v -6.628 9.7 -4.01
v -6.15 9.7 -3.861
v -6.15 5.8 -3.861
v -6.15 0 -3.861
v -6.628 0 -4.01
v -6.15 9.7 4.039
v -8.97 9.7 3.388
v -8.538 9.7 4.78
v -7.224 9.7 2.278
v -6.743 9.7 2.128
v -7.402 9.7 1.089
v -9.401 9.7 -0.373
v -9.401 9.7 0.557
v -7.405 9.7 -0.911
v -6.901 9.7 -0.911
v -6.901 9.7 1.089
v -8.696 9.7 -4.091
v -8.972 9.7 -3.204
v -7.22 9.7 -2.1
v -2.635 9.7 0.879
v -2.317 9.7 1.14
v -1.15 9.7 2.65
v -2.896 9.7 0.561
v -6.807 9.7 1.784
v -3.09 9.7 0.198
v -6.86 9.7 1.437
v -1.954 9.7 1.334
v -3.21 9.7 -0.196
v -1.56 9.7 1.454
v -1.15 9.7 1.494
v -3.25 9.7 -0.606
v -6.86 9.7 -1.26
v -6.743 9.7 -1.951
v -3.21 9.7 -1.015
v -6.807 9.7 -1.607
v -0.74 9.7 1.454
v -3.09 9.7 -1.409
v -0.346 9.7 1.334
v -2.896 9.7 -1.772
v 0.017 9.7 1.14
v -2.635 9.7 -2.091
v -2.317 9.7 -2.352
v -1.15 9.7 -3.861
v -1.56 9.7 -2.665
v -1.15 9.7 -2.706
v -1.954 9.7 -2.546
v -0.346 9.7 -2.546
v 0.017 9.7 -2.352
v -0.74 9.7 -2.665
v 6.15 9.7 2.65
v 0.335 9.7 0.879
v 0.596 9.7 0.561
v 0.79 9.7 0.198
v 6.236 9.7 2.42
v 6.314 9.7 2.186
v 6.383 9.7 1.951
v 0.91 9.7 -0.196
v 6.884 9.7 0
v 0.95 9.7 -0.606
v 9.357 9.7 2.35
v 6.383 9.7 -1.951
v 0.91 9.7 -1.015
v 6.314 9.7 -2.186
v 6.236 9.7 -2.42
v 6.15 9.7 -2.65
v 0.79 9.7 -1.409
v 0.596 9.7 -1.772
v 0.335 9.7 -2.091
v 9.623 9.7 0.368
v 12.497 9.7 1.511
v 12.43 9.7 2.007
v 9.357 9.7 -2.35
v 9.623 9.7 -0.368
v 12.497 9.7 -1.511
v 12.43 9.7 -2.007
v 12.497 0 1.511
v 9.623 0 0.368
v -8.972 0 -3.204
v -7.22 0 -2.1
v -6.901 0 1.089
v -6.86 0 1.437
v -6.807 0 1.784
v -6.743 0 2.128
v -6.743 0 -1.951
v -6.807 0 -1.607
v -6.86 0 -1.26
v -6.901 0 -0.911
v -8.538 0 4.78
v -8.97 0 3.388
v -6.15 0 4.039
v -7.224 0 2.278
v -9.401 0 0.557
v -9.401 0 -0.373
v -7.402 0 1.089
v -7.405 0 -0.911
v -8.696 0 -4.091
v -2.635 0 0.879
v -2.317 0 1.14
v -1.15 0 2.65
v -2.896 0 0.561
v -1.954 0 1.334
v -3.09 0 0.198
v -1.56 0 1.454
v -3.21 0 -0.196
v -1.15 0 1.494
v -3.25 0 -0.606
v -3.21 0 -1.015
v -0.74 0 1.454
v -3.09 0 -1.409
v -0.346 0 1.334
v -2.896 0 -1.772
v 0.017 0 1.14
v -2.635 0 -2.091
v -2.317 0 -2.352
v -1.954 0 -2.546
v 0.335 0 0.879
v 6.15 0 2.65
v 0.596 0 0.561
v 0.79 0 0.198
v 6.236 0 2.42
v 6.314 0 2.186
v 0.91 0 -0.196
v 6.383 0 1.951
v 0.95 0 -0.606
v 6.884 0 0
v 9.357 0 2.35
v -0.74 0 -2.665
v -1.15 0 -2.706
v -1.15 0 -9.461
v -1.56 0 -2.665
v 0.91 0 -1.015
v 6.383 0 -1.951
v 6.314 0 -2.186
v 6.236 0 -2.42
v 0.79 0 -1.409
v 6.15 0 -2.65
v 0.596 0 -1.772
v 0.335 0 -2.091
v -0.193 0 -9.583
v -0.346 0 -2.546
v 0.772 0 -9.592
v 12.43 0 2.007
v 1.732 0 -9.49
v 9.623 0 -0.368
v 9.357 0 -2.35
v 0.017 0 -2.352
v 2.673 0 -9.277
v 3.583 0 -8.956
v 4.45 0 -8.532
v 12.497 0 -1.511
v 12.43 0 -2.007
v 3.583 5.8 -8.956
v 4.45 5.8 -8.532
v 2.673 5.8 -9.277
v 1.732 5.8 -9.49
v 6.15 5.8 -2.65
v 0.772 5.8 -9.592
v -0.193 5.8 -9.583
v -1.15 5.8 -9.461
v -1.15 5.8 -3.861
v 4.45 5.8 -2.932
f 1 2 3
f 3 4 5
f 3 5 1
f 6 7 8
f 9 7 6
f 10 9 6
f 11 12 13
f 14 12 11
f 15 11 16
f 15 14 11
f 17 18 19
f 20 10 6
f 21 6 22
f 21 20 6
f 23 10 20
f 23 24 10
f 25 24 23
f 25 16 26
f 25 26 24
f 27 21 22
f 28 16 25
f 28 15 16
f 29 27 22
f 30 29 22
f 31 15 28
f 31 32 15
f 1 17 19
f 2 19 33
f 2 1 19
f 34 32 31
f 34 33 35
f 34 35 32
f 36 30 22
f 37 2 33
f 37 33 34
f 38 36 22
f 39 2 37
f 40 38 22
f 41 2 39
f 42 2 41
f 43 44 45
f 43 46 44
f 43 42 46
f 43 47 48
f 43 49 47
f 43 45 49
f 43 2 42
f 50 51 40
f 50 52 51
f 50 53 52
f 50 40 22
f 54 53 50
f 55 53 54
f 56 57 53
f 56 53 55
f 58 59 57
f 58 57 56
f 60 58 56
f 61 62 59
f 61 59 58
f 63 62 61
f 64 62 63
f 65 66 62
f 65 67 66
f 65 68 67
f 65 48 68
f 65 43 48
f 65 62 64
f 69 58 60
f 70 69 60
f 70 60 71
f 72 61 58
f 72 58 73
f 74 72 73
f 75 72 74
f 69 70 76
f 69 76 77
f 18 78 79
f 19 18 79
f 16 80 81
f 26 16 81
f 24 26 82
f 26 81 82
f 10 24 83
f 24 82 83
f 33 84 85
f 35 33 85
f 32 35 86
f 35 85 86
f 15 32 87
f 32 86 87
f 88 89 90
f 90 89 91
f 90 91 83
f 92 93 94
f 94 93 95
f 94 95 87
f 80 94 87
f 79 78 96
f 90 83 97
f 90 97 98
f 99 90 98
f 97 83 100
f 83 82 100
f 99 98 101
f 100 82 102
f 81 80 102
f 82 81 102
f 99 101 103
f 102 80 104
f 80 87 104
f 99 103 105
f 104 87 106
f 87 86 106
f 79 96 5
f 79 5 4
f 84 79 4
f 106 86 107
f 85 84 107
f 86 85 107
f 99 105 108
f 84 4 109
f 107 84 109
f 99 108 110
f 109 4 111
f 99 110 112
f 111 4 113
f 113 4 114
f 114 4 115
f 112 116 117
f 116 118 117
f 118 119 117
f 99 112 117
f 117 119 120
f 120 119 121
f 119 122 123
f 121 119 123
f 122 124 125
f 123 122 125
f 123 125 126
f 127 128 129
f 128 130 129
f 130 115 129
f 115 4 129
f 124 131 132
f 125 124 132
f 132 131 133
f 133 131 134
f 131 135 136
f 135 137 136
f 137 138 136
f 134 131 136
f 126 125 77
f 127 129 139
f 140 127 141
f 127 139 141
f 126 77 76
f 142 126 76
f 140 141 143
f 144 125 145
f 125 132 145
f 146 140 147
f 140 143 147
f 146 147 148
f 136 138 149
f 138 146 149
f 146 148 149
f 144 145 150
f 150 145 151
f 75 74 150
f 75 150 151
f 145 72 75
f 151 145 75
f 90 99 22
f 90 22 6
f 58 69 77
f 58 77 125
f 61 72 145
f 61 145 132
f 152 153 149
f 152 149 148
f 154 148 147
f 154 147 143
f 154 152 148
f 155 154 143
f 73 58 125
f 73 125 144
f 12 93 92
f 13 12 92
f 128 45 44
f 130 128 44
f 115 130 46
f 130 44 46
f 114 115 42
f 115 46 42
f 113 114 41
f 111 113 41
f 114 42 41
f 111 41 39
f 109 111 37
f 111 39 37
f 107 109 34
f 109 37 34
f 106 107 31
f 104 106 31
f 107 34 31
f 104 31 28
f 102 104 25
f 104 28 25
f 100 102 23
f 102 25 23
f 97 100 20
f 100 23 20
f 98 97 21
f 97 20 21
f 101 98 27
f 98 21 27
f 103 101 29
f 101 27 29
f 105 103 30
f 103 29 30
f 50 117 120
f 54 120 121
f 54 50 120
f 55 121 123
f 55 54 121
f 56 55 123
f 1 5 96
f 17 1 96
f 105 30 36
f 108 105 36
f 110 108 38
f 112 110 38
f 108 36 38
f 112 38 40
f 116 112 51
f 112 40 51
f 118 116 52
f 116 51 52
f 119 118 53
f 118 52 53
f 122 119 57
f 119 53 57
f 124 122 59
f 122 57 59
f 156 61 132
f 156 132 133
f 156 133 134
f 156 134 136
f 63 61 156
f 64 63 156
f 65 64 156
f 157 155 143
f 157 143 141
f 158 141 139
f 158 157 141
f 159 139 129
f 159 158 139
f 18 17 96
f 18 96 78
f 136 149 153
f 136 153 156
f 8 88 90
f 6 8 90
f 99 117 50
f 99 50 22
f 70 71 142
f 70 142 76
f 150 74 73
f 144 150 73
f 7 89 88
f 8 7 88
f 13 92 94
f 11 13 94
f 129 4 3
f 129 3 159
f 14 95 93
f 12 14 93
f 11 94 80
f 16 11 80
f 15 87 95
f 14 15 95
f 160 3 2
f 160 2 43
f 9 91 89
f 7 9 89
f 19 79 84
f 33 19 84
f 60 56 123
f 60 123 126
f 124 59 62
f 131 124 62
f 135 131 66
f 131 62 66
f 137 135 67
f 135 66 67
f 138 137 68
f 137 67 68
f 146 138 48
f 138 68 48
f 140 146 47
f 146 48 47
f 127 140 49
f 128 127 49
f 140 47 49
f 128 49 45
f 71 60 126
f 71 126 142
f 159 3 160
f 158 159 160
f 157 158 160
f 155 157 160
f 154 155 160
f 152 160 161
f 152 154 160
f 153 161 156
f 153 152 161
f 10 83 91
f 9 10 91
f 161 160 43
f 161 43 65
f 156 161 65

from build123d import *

# Parameters (mm, degrees)
BOSS_EXTRUDE1_DEPTH = 9.7
BOSS_EXTRUDE2_DEPTH = 5.8
CUT_EXTRUDE1_DEPTH  = 15.880557968
BOSS_EXTRUDE9_REACH = 16.881
BOSS_EXTRUDE8_START = -9.7
BOSS_EXTRUDE8_DEPTH = 9.7
BOSS_EXTRUDE5_DEPTH = 5.8
CUT_EXTRUDE2_DEPTH  = 9.7


# Read off the part's stored shape, not the designer's step: Boss-Extrude8
with BuildPart() as part:
    # Sketch1 → Boss-Extrude1 (new body)
    with BuildSketch(Plane(origin=(0, 0, 0), x_dir=(1, 0, 0), z_dir=(0, 1, 0))):
        Polygon((6.15, 2.65), (6.15, -2.65), (-1.15, -2.65), (-6.15, -4.038578044), (-6.15, 3.861421956), (-1.15, 3.861421956), align=None)
    extrude(amount=BOSS_EXTRUDE1_DEPTH)

    # Sketch2 → Boss-Extrude2 (add)
    with BuildSketch(Plane.XZ):
        Polygon((-6.15, -3.861421956), (-1.15, -9.461421956), (-1.15, -3.861421956), align=None)
        Polygon((-1.15, -3.861421956), (-1.15, -9.461421956), (4.45, -8.532111962), (4.45, -2.932111962), align=None)
        Polygon((4.45, -2.932111962), (4.45, -8.532111962), (6.15, -2.65), align=None)
    extrude(amount=-BOSS_EXTRUDE2_DEPTH)

    # Sketch3 → Cut-Extrude1 (cut, through all)
    with BuildSketch(Plane(origin=(0, 9.7, 0), x_dir=(1, 0, 0), z_dir=(0, 1, 0))):
        with BuildLine():
            ThreePointArc((0.95, 0.605710978), (0.33492424, 2.090635219), (-1.15, 2.705710978))
            Line((-1.15, 2.705710978), (-1.15, -1.494289022))
            ThreePointArc((-1.15, -1.494289022), (0.33492424, -0.879213262), (0.95, 0.605710978))
        make_face()
        with BuildLine():
            Line((-1.15, -1.494289022), (-1.15, 2.705710978))
            ThreePointArc((-1.15, 2.705710978), (-3.25, 0.605710978), (-1.15, -1.494289022))
        make_face()
    extrude(amount=-CUT_EXTRUDE1_DEPTH, mode=Mode.SUBTRACT)

    # Boss-Extrude9: up to this face of the body (flat: up to its plane)
    boss_extrude9_end = Plane(part.part.faces().sort_by_distance((0.174384558, 0, -2.694350329))[0])
    # Sketch4 → Boss-Extrude9 (add, up to the picked face)
    with BuildSketch(Plane(origin=(0, 9.7, 0), x_dir=(1, 0, 0), z_dir=(0, 1, 0)), mode=Mode.PRIVATE) as boss_extrude9_sk1:
        with BuildLine():
            Line((12.596453684, 0.767826071), (12.330020735, 2.75))
            Line((12.330020735, 2.75), (6.383498949, 1.950701151))
            ThreePointArc((6.383498949, 1.950701151), (6.27561663, 2.303311358), (6.15, 2.65))
            Line((6.15, 2.65), (6.15, -2.65))
            ThreePointArc((6.15, -2.65), (6.27561663, -2.303311358), (6.383498949, -1.950701151))
            Line((6.383498949, -1.950701151), (12.330020735, -2.75))
            Line((12.330020735, -2.75), (12.596453684, -0.767826071))
            Line((12.596453684, -0.767826071), (6.884079059, 0))
            Line((6.884079059, 0), (12.596453684, 0.767826071))
        make_face()
    boss_extrude9_tool1 = split(extrude(boss_extrude9_sk1.sketch, amount=-BOSS_EXTRUDE9_REACH, mode=Mode.PRIVATE), bisect_by=boss_extrude9_end, keep=Keep.BOTH, mode=Mode.PRIVATE)
    add(boss_extrude9_tool1.solids().sort_by(Axis((6.19524, 9.7, -2.276473), (0, -1, 0)))[0])

    # Boss-Extrude8 outline → Boss-Extrude8 (add)
    with BuildSketch(Plane(origin=(0, 9.7, 0), x_dir=(1, 0, 0), z_dir=(0, 1, 0)).offset(BOSS_EXTRUDE8_START)):
        with BuildLine():
            Line((-7.223773577, -2.277754847), (-8.969746456, -3.387643024))
            Line((-8.969746456, -3.387643024), (-8.537608436, -4.779743311))
            Line((-8.537608436, -4.779743311), (-6.15, -4.038578044))
            Line((-6.15, -4.038578044), (-6.15, 3.861421956))
            Line((-6.15, 3.861421956), (-6.627521687, 4.00965501))
            Line((-6.627521687, 4.00965501), (-8.696484144, 4.090781022))
            Line((-8.696484144, 4.090781022), (-8.971664943, 3.204306677))
            Line((-8.971664943, 3.204306677), (-7.220453901, 2.099568261))
            Line((-7.220453901, 2.099568261), (-6.742932214, 1.951335207))
            ThreePointArc((-6.742932214, 1.951335207), (-6.835256527, 1.433422288), (-6.900626431, 0.911421956))
            Line((-6.900626431, 0.911421956), (-7.405143495, 0.911421956))
            Line((-7.405143495, 0.911421956), (-9.400626431, 0.373036291))
            Line((-9.400626431, 0.373036291), (-9.400626431, -0.556661548))
            Line((-9.400626431, -0.556661548), (-7.401686619, -1.088575255))
            Line((-7.401686619, -1.088575255), (-6.900626431, -1.088578044))
            ThreePointArc((-6.900626431, -1.088578044), (-6.835256527, -1.610578376), (-6.742932214, -2.128491295))
            Line((-6.742932214, -2.128491295), (-7.223773577, -2.277754847))
        make_face()
    extrude(amount=BOSS_EXTRUDE8_DEPTH)

    # Sketch8 → Boss-Extrude5 (add)
    with BuildSketch(Plane(origin=(0, 5.8, 0), x_dir=(1, 0, 0), z_dir=(0, 1, 0))):
        with BuildLine():
            ThreePointArc((1.731854671, 9.490021268), (0.289677429, 9.601670434), (-1.15, 9.461421956))
            Line((-1.15, 9.461421956), (1.65, 8.996766959))
            Line((1.65, 8.996766959), (1.731854671, 9.490021268))
        make_face()
        with BuildLine():
            Line((1.731854671, 9.490021268), (1.65, 8.996766959))
            Line((1.65, 8.996766959), (4.45, 8.532111962))
            ThreePointArc((4.45, 8.532111962), (3.132791885, 9.12986067), (1.731854671, 9.490021268))
        make_face()
    extrude(amount=-BOSS_EXTRUDE5_DEPTH)

    # Sketch5 → Cut-Extrude2 (cut)
    with BuildSketch(Plane(origin=(0, 9.7, 0), x_dir=(1, 0, 0), z_dir=(0, 1, 0))):
        Polygon((9.623192791, 0.368176647), (12.596453684, 0.767826071), (12.496541328, 1.511141295), align=None)
        Polygon((9.356759842, 2.350350576), (12.429933091, 2.006684777), (12.330020735, 2.75), align=None)
        Polygon((12.429933091, -2.006684777), (12.330020735, -2.75), (9.356759842, -2.350350576), align=None)
        Polygon((12.596453684, -0.767826071), (12.496541328, -1.511141295), (9.623192791, -0.368176647), align=None)
    extrude(amount=-CUT_EXTRUDE2_DEPTH, mode=Mode.SUBTRACT)


solid = part.part
